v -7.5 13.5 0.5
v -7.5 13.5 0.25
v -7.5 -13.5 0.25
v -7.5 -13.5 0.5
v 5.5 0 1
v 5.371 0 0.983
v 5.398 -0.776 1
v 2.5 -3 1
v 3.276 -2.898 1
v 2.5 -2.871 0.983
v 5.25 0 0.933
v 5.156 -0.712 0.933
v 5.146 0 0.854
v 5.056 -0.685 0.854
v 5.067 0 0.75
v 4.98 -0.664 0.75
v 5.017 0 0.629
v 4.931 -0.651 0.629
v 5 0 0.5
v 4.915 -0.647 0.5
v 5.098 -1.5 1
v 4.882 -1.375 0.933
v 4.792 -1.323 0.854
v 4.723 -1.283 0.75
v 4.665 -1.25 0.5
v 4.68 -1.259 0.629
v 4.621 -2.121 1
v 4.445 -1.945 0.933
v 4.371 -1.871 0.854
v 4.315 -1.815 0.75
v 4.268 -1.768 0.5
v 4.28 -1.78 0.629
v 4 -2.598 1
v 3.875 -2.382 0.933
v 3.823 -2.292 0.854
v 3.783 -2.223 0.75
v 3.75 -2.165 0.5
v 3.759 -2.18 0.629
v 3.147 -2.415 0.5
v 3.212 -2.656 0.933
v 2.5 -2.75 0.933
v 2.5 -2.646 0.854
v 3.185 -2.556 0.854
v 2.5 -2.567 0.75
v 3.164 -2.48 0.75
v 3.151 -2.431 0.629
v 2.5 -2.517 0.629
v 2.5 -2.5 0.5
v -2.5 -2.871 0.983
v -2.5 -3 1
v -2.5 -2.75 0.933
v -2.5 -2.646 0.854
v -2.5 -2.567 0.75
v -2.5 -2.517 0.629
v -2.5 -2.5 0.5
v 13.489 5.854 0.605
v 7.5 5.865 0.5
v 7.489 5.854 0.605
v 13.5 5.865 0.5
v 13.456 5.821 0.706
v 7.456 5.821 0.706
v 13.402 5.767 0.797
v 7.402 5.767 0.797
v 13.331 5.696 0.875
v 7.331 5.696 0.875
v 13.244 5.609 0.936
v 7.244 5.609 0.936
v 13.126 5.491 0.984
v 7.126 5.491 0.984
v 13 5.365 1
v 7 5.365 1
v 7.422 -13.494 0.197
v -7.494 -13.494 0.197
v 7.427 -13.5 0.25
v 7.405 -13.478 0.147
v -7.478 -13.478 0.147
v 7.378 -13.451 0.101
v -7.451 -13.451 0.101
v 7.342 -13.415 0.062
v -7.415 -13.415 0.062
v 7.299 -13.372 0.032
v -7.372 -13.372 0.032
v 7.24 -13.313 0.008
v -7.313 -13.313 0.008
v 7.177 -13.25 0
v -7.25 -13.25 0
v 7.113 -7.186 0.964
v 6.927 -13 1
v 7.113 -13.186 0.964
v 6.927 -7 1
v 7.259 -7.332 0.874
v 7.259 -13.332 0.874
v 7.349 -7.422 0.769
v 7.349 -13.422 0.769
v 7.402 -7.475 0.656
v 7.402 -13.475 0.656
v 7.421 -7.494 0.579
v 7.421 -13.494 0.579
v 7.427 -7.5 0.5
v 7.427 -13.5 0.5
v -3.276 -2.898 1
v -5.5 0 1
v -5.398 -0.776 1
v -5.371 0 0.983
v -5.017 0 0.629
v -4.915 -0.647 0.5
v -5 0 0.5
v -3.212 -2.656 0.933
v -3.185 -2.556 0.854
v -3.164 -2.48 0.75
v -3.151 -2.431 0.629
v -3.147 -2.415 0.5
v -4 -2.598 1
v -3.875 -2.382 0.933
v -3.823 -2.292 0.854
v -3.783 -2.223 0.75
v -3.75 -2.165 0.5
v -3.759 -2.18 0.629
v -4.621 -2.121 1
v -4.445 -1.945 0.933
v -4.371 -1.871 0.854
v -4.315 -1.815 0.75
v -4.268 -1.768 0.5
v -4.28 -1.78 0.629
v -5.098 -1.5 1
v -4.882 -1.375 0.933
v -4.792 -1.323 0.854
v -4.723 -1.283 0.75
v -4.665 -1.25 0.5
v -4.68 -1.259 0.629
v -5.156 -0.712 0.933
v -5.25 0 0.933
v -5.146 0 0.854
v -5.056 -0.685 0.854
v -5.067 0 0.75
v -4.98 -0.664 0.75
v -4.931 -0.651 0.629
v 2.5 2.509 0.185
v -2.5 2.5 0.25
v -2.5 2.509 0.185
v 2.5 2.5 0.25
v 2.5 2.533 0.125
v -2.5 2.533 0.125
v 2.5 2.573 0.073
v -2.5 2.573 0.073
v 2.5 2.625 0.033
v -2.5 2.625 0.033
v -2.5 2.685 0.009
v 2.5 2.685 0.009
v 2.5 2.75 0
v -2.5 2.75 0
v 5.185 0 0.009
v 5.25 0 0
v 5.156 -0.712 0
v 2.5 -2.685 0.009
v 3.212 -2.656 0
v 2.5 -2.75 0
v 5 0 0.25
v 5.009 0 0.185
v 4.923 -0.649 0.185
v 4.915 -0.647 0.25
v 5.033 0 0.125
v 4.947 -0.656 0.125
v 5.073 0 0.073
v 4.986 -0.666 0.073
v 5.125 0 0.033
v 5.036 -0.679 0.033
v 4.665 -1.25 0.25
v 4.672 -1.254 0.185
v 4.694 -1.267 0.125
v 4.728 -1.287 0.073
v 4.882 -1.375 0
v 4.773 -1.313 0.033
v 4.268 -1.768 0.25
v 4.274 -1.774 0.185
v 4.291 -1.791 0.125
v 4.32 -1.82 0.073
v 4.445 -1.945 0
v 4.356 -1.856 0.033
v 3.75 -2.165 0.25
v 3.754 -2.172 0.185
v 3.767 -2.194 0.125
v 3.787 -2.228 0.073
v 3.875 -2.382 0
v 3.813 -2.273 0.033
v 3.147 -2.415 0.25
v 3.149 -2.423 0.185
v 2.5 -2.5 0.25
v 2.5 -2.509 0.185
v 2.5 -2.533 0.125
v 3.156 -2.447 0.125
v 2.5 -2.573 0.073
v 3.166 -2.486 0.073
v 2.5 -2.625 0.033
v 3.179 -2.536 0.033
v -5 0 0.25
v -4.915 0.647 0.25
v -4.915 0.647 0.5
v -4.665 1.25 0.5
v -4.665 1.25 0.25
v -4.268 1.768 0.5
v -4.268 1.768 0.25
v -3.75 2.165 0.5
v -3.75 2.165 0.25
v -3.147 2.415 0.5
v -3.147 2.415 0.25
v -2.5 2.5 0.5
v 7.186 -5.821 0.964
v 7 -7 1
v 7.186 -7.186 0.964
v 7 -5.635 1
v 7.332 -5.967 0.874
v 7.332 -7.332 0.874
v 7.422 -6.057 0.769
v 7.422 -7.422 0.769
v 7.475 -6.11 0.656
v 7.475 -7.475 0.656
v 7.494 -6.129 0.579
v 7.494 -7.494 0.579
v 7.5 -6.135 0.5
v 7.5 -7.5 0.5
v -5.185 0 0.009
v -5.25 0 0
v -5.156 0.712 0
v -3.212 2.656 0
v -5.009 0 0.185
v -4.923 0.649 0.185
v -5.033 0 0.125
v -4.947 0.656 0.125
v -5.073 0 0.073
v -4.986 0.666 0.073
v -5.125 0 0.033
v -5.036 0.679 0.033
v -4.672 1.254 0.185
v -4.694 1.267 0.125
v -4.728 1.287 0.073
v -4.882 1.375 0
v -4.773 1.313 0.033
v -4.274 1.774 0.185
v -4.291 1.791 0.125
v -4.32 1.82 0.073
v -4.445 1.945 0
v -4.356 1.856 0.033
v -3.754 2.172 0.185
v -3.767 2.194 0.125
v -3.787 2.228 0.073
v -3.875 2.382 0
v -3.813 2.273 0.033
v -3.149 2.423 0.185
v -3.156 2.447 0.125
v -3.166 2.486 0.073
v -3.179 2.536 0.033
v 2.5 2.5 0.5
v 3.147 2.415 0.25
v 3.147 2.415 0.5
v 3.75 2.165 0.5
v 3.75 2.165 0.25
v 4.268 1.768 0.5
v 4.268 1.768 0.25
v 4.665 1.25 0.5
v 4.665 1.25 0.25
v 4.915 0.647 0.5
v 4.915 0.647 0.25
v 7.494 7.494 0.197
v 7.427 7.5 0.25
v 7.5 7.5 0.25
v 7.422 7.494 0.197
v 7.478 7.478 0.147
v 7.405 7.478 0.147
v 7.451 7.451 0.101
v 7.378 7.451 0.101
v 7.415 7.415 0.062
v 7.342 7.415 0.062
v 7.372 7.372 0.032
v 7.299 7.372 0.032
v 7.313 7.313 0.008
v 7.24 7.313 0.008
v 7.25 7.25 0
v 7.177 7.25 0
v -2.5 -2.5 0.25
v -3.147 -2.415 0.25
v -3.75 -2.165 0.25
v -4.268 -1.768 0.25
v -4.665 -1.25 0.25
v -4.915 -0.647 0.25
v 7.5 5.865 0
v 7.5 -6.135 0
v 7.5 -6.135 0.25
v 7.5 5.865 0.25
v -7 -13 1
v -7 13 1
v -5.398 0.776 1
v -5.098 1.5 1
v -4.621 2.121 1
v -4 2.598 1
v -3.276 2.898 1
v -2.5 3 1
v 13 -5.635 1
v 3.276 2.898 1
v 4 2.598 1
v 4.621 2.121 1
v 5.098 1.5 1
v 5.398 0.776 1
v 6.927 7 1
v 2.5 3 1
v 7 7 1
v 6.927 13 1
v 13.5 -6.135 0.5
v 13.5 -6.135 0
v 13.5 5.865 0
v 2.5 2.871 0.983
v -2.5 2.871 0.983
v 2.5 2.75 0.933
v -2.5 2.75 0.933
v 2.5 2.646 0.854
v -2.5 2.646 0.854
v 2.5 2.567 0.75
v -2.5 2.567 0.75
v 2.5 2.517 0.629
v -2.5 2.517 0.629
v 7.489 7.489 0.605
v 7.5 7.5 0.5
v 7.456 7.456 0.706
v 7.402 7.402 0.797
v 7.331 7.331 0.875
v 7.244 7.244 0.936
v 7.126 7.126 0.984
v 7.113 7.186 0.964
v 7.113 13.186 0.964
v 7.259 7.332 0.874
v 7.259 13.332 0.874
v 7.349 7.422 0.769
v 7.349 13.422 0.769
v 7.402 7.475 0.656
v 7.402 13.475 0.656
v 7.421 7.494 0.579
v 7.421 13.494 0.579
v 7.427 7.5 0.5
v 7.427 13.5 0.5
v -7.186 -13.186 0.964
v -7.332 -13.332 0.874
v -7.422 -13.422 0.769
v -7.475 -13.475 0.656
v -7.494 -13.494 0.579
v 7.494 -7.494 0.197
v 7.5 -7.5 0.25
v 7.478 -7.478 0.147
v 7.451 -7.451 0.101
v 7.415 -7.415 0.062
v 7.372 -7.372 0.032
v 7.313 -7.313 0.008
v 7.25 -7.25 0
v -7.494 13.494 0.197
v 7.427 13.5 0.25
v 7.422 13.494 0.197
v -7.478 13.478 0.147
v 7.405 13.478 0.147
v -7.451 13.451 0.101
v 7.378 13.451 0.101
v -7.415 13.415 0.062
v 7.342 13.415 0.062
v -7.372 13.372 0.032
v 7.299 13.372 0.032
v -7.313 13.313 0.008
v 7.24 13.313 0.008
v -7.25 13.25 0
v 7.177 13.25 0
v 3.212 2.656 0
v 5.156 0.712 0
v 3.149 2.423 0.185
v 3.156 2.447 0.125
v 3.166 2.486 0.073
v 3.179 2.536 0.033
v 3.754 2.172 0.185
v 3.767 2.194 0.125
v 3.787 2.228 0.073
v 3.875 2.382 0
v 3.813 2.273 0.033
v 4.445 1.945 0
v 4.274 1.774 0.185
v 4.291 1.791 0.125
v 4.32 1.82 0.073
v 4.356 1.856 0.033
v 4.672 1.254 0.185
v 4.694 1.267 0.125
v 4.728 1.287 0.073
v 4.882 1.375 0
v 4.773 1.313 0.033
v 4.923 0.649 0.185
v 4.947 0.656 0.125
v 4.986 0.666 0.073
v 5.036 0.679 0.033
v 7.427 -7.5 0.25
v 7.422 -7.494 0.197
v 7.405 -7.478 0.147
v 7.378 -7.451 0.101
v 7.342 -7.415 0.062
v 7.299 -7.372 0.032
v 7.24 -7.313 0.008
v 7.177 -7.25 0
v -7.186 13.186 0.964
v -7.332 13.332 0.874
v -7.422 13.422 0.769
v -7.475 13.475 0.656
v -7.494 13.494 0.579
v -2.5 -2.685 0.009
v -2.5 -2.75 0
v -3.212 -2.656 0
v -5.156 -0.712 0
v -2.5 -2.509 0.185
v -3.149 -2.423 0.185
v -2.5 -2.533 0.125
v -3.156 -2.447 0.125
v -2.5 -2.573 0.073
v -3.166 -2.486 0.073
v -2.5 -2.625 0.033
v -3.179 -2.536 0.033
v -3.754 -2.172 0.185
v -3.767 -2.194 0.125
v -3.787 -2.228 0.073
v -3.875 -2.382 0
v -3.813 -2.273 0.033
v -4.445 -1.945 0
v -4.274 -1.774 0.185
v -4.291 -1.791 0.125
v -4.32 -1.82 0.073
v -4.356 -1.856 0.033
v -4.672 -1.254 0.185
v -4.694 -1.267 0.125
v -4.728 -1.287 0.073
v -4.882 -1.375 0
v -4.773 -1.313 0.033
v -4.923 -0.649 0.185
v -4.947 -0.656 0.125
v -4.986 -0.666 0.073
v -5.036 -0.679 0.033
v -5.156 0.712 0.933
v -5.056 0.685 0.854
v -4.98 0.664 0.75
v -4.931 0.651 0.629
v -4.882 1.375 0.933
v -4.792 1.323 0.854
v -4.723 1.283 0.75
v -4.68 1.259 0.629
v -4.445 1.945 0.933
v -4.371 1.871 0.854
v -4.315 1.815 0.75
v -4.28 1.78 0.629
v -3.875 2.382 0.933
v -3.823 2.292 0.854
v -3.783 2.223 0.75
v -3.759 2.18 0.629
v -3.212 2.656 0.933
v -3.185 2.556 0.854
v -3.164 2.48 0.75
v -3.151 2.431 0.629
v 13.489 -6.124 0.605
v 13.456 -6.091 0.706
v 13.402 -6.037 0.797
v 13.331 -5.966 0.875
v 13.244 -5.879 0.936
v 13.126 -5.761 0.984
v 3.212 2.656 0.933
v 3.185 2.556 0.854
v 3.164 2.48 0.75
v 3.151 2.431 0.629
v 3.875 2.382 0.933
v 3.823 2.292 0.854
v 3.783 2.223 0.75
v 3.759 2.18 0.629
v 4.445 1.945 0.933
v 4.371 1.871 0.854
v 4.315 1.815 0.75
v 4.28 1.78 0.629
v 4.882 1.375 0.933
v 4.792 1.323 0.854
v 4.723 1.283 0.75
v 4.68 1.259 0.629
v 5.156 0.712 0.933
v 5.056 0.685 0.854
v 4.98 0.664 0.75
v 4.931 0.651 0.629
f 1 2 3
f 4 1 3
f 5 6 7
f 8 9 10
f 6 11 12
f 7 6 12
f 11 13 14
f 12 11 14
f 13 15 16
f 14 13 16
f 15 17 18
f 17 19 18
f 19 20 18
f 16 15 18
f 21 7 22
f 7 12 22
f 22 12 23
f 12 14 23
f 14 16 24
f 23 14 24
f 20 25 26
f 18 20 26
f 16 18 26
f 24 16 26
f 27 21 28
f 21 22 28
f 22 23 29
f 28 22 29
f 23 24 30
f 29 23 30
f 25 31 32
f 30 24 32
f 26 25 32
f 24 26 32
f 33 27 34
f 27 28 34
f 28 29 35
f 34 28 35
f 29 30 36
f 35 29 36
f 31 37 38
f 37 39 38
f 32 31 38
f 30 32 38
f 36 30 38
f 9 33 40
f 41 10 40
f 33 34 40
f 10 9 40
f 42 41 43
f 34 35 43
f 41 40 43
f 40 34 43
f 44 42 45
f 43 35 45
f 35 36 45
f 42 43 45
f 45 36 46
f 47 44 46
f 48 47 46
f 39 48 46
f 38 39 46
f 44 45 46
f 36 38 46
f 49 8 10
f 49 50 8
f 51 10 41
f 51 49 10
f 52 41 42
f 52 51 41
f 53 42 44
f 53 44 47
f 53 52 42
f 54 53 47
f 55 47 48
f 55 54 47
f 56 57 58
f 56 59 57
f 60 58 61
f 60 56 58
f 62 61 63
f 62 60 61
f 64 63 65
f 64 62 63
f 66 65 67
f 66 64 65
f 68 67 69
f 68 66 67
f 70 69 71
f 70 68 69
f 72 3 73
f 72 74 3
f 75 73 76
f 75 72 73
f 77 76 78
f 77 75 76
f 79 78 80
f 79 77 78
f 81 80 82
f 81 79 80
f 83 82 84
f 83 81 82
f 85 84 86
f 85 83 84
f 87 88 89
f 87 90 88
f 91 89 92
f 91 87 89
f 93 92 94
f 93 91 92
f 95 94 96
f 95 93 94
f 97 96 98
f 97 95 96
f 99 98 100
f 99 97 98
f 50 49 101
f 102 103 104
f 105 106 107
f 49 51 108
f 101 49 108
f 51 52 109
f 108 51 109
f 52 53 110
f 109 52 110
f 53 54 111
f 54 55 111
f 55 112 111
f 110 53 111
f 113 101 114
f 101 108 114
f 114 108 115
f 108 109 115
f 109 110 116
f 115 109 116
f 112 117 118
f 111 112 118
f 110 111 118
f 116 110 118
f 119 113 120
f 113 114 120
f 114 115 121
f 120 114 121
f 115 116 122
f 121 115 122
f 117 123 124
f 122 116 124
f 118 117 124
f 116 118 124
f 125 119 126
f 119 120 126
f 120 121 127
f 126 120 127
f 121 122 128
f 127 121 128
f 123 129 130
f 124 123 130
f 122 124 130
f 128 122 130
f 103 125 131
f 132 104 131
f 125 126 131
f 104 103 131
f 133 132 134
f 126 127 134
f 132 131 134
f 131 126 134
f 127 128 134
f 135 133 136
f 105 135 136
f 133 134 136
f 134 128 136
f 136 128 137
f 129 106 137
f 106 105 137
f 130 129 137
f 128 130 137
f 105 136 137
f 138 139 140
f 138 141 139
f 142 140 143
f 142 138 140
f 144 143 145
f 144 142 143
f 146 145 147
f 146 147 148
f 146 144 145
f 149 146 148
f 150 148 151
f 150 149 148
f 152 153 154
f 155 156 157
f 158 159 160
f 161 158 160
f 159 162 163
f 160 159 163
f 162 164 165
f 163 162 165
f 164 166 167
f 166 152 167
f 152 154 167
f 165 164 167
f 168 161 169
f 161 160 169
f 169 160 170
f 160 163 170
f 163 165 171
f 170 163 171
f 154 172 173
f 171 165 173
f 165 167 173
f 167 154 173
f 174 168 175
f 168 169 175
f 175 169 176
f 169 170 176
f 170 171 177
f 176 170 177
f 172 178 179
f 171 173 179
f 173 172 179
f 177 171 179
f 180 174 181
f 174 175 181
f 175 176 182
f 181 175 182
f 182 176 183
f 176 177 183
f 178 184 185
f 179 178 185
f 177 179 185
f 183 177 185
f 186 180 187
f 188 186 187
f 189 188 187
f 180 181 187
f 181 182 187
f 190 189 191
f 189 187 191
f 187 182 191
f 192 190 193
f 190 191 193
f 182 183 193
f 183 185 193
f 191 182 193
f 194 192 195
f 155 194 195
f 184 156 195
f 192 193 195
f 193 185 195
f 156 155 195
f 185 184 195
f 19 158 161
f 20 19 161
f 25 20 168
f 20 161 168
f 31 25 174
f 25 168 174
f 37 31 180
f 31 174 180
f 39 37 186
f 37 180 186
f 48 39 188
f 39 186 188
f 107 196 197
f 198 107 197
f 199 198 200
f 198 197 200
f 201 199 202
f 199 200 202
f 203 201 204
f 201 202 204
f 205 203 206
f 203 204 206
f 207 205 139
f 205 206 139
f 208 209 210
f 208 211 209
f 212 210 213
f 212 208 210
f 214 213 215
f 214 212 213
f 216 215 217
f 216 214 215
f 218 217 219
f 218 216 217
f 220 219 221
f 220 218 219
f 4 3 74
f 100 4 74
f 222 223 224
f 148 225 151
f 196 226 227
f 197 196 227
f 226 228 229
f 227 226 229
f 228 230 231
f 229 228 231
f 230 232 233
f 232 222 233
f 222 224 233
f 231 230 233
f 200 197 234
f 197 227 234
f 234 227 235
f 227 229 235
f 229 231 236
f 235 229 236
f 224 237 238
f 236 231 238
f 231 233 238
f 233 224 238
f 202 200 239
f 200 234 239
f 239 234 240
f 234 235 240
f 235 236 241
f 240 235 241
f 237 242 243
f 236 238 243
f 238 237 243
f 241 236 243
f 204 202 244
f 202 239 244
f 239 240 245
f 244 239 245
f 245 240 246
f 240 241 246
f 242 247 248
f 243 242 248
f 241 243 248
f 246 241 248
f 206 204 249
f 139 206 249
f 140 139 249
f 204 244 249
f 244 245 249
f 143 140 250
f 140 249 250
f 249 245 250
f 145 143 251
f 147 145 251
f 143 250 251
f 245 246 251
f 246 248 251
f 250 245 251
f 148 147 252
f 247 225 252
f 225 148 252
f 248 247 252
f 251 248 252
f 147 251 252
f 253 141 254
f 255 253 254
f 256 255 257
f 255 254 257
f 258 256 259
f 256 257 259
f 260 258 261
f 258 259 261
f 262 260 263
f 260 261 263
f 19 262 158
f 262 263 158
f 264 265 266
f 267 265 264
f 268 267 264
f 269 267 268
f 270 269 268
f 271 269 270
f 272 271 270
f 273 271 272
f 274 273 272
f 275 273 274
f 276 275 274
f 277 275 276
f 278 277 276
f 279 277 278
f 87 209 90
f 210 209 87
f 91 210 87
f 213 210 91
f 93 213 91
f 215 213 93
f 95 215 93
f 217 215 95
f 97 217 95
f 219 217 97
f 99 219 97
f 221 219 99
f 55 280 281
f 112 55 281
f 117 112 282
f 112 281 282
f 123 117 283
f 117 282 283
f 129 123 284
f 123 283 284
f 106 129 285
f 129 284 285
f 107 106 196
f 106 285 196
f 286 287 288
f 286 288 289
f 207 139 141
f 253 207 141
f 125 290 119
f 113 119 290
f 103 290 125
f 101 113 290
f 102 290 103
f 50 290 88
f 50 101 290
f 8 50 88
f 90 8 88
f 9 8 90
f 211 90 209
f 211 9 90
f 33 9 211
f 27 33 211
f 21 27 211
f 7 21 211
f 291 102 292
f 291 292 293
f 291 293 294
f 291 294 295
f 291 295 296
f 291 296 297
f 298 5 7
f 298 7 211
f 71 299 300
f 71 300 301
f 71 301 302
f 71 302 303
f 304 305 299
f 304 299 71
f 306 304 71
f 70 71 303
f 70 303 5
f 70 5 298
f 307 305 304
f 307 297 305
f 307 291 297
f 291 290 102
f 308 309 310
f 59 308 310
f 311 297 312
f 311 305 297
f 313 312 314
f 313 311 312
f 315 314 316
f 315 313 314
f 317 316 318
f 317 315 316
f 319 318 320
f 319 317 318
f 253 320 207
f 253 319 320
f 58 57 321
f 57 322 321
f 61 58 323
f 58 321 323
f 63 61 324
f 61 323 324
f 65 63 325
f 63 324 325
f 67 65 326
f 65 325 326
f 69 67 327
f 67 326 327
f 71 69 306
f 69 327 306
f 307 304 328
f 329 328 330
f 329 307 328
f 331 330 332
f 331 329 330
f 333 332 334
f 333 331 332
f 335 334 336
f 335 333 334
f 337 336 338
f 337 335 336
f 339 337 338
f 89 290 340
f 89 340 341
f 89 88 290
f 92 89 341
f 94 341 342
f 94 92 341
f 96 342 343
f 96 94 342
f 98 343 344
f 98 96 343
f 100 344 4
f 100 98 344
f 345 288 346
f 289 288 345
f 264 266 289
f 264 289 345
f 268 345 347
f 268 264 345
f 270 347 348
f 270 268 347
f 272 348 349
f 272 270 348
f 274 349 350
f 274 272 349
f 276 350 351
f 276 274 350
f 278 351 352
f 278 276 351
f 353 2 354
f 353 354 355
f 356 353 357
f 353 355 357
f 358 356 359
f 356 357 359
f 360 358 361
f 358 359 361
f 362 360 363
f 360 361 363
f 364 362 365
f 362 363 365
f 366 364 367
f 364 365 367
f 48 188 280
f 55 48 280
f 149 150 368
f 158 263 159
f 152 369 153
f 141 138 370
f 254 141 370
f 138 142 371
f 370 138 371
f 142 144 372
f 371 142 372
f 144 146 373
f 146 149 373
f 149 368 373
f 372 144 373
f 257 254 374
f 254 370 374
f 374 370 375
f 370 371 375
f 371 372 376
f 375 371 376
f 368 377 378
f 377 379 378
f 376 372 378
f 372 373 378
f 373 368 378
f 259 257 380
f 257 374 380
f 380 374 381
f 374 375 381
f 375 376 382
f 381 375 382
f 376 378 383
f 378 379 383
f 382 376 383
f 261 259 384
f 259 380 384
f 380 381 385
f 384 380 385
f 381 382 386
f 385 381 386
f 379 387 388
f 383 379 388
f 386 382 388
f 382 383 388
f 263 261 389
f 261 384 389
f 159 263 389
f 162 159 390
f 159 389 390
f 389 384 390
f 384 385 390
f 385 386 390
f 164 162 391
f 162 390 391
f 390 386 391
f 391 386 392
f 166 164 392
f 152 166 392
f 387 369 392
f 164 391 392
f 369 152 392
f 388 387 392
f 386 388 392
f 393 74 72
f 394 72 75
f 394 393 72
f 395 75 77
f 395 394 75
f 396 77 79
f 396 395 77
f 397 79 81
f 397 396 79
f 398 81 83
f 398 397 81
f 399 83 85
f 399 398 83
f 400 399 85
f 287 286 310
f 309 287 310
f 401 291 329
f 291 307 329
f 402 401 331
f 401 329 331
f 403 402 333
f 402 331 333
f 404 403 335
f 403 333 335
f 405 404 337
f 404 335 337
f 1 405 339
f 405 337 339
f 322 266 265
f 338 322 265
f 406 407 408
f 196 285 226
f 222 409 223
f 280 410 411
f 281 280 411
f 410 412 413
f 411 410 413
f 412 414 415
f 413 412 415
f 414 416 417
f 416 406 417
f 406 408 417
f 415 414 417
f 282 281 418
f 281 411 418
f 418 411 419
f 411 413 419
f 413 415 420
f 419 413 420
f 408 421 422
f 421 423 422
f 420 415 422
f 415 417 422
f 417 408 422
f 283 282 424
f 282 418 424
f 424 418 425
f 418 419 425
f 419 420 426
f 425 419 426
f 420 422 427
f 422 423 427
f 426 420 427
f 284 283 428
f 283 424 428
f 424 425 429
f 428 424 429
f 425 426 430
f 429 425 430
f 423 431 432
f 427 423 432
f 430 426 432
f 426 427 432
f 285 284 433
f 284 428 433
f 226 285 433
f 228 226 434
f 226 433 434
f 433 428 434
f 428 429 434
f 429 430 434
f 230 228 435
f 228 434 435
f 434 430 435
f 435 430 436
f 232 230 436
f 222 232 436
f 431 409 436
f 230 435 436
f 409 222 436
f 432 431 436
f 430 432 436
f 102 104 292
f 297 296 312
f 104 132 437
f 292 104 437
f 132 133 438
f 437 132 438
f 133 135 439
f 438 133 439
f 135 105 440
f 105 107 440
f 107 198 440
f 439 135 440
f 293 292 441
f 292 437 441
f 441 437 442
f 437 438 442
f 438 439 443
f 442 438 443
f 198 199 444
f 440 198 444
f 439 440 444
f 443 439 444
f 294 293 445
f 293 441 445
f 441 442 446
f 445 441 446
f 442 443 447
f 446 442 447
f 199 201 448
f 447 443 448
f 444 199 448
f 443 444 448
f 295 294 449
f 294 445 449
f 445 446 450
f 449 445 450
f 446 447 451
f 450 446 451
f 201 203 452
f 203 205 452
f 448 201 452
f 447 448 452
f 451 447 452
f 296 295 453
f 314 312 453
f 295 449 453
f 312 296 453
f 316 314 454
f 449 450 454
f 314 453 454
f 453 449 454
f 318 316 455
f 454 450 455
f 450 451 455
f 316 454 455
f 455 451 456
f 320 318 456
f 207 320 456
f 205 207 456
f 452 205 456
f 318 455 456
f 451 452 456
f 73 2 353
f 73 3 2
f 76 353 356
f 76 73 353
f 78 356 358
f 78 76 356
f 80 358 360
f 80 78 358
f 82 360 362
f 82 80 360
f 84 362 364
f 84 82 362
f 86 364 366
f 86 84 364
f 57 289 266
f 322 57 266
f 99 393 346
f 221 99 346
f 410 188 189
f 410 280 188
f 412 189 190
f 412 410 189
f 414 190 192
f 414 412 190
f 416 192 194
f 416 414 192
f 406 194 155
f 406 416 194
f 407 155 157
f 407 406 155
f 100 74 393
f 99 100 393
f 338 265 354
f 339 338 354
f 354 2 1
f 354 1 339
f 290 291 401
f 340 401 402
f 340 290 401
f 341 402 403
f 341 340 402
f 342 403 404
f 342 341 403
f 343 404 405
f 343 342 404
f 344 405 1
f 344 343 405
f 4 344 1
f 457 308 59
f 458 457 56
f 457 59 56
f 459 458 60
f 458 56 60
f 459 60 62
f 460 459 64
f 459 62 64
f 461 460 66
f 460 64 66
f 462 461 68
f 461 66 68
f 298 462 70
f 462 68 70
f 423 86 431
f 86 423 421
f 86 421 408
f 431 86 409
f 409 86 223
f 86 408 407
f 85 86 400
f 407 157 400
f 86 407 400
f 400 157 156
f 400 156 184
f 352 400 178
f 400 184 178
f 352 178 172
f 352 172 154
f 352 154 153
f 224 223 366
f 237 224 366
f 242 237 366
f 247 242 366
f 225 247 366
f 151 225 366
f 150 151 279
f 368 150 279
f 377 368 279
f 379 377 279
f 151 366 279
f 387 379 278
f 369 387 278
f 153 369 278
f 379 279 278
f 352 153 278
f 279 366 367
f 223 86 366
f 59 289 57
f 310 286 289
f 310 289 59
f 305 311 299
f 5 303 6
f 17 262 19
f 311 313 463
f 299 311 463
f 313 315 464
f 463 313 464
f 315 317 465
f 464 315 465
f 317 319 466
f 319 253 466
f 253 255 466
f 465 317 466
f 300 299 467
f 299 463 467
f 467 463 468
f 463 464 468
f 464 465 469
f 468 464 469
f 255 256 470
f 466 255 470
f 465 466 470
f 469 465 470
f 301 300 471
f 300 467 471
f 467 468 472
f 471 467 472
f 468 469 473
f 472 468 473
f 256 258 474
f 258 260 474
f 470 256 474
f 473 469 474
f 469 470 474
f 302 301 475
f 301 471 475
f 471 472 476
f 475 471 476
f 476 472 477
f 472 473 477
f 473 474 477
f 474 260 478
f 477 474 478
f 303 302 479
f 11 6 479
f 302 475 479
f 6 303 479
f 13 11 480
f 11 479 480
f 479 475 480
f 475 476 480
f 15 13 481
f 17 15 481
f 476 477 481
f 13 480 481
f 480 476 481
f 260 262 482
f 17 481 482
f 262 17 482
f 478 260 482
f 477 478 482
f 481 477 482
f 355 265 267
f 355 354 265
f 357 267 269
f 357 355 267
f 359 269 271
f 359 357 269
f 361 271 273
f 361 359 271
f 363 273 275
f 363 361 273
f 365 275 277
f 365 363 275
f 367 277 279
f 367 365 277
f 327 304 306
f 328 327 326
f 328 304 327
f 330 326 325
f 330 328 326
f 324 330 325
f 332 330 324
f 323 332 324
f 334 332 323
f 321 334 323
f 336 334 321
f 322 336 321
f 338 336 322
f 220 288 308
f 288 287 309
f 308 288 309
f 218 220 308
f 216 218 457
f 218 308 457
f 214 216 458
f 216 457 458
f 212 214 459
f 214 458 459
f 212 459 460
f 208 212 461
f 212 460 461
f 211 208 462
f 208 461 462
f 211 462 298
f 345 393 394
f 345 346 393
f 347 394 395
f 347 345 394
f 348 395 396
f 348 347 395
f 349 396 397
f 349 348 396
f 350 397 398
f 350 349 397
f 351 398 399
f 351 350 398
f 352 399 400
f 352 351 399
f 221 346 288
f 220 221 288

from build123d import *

# Parameters (mm, degrees)
F0_W     = 14.9271550402
F0_H     = 6
F1_DEPTH = 1
F2_R     = 0.25
F3_DEPTH = 1
F0_W_2   = 6
F0_H_2   = 12
F4_DEPTH = 1
F5_R     = 0.5


# Not quite as in the source:
# - a feature names something its author has since deleted; it is built from what else it names


with BuildPart() as f1:
    # F0 (on Top) → F1 (new body)
    with BuildSketch(Plane.XY):
        with Locations((-0.0364224799, 10.5)):
            Rectangle(F0_W, F0_H)
        Polygon((7.4271550402, 7.5), (-7.5, 7.5), (-7.5, -7.5), (7.4271550402, -7.5), (7.5, -7.5), (7.5, -6.1350027099), (7.5, 5.8649972901), (7.5, 7.5), align=None)
        with BuildLine():
            ThreePointArc((-5, 0), (-4.267766953, 1.767766953), (-2.5, 2.5))
            Line((-2.5, 2.5), (2.5, 2.5))
            ThreePointArc((2.5, 2.5), (4.267766953, 1.767766953), (5, 0))
            ThreePointArc((5, 0), (4.267766953, -1.767766953), (2.5, -2.5))
            Line((2.5, -2.5), (-2.5, -2.5))
            ThreePointArc((-2.5, -2.5), (-4.267766953, -1.767766953), (-5, 0))
        make_face(mode=Mode.SUBTRACT)
        with Locations((-0.0364224799, -10.5)):
            Rectangle(F0_W, F0_H)
    extrude(amount=F1_DEPTH)

    # F2
    f2_edges = [f1.edges().sort_by_distance(p)[0] for p in [
        (-0.036422, 13.5, 0),
        (-7.5, 0, 0),
        (-0.036422, -13.5, 0),
        (7.427155, -10.5, 0),
        (7.463578, -7.5, 0),
        (7.5, 0, 0),
        (7.463578, 7.5, 0),
        (7.427155, 10.5, 0),
        (-5, 0, 0),
        (0, 2.5, 0),
        (5, 0, 0),
        (0, -2.5, 0),
    ]]
    fillet(f2_edges, radius=F2_R)

    # F0 (on Top) → F3 (cut)
    with BuildSketch(Plane.XY):
        with BuildLine():
            Line((2.5, 2.5), (-2.5, 2.5))
            ThreePointArc((-2.5, 2.5), (-4.267766953, 1.767766953), (-5, 0))
            ThreePointArc((-5, 0), (-4.267766953, -1.767766953), (-2.5, -2.5))
            Line((-2.5, -2.5), (2.5, -2.5))
            ThreePointArc((2.5, -2.5), (4.267766953, -1.767766953), (5, 0))
            ThreePointArc((5, 0), (4.267766953, 1.767766953), (2.5, 2.5))
        make_face()
    extrude(amount=F3_DEPTH, mode=Mode.SUBTRACT)

    # F0 (on Top) → F4 (join)
    with BuildSketch(Plane.XY):
        with Locations((10.5, -0.1350027099)):
            Rectangle(F0_W_2, F0_H_2)
    extrude(amount=F4_DEPTH)

    # F5
    f5_edges = [f1.edges().sort_by_distance(p)[0] for p in [
        (-0.036422, 13.5, 1),
        (-7.5, 0, 1),
        (-0.036422, -13.5, 1),
        (7.427155, -10.5, 1),
        (7.463578, -7.5, 1),
        (7.5, -6.817501, 1),
        (10.5, -6.135003, 1),
        (13.5, -0.135003, 1),
        (10.5, 5.864997, 1),
        (7.5, 6.682499, 1),
        (7.463578, 7.5, 1),
        (7.427155, 10.5, 1),
        (-5, 0, 1),
        (0, 2.5, 1),
        (5, 0, 1),
        (0, -2.5, 1),
    ]]
    fillet(f5_edges, radius=F5_R)


solid = f1.part
